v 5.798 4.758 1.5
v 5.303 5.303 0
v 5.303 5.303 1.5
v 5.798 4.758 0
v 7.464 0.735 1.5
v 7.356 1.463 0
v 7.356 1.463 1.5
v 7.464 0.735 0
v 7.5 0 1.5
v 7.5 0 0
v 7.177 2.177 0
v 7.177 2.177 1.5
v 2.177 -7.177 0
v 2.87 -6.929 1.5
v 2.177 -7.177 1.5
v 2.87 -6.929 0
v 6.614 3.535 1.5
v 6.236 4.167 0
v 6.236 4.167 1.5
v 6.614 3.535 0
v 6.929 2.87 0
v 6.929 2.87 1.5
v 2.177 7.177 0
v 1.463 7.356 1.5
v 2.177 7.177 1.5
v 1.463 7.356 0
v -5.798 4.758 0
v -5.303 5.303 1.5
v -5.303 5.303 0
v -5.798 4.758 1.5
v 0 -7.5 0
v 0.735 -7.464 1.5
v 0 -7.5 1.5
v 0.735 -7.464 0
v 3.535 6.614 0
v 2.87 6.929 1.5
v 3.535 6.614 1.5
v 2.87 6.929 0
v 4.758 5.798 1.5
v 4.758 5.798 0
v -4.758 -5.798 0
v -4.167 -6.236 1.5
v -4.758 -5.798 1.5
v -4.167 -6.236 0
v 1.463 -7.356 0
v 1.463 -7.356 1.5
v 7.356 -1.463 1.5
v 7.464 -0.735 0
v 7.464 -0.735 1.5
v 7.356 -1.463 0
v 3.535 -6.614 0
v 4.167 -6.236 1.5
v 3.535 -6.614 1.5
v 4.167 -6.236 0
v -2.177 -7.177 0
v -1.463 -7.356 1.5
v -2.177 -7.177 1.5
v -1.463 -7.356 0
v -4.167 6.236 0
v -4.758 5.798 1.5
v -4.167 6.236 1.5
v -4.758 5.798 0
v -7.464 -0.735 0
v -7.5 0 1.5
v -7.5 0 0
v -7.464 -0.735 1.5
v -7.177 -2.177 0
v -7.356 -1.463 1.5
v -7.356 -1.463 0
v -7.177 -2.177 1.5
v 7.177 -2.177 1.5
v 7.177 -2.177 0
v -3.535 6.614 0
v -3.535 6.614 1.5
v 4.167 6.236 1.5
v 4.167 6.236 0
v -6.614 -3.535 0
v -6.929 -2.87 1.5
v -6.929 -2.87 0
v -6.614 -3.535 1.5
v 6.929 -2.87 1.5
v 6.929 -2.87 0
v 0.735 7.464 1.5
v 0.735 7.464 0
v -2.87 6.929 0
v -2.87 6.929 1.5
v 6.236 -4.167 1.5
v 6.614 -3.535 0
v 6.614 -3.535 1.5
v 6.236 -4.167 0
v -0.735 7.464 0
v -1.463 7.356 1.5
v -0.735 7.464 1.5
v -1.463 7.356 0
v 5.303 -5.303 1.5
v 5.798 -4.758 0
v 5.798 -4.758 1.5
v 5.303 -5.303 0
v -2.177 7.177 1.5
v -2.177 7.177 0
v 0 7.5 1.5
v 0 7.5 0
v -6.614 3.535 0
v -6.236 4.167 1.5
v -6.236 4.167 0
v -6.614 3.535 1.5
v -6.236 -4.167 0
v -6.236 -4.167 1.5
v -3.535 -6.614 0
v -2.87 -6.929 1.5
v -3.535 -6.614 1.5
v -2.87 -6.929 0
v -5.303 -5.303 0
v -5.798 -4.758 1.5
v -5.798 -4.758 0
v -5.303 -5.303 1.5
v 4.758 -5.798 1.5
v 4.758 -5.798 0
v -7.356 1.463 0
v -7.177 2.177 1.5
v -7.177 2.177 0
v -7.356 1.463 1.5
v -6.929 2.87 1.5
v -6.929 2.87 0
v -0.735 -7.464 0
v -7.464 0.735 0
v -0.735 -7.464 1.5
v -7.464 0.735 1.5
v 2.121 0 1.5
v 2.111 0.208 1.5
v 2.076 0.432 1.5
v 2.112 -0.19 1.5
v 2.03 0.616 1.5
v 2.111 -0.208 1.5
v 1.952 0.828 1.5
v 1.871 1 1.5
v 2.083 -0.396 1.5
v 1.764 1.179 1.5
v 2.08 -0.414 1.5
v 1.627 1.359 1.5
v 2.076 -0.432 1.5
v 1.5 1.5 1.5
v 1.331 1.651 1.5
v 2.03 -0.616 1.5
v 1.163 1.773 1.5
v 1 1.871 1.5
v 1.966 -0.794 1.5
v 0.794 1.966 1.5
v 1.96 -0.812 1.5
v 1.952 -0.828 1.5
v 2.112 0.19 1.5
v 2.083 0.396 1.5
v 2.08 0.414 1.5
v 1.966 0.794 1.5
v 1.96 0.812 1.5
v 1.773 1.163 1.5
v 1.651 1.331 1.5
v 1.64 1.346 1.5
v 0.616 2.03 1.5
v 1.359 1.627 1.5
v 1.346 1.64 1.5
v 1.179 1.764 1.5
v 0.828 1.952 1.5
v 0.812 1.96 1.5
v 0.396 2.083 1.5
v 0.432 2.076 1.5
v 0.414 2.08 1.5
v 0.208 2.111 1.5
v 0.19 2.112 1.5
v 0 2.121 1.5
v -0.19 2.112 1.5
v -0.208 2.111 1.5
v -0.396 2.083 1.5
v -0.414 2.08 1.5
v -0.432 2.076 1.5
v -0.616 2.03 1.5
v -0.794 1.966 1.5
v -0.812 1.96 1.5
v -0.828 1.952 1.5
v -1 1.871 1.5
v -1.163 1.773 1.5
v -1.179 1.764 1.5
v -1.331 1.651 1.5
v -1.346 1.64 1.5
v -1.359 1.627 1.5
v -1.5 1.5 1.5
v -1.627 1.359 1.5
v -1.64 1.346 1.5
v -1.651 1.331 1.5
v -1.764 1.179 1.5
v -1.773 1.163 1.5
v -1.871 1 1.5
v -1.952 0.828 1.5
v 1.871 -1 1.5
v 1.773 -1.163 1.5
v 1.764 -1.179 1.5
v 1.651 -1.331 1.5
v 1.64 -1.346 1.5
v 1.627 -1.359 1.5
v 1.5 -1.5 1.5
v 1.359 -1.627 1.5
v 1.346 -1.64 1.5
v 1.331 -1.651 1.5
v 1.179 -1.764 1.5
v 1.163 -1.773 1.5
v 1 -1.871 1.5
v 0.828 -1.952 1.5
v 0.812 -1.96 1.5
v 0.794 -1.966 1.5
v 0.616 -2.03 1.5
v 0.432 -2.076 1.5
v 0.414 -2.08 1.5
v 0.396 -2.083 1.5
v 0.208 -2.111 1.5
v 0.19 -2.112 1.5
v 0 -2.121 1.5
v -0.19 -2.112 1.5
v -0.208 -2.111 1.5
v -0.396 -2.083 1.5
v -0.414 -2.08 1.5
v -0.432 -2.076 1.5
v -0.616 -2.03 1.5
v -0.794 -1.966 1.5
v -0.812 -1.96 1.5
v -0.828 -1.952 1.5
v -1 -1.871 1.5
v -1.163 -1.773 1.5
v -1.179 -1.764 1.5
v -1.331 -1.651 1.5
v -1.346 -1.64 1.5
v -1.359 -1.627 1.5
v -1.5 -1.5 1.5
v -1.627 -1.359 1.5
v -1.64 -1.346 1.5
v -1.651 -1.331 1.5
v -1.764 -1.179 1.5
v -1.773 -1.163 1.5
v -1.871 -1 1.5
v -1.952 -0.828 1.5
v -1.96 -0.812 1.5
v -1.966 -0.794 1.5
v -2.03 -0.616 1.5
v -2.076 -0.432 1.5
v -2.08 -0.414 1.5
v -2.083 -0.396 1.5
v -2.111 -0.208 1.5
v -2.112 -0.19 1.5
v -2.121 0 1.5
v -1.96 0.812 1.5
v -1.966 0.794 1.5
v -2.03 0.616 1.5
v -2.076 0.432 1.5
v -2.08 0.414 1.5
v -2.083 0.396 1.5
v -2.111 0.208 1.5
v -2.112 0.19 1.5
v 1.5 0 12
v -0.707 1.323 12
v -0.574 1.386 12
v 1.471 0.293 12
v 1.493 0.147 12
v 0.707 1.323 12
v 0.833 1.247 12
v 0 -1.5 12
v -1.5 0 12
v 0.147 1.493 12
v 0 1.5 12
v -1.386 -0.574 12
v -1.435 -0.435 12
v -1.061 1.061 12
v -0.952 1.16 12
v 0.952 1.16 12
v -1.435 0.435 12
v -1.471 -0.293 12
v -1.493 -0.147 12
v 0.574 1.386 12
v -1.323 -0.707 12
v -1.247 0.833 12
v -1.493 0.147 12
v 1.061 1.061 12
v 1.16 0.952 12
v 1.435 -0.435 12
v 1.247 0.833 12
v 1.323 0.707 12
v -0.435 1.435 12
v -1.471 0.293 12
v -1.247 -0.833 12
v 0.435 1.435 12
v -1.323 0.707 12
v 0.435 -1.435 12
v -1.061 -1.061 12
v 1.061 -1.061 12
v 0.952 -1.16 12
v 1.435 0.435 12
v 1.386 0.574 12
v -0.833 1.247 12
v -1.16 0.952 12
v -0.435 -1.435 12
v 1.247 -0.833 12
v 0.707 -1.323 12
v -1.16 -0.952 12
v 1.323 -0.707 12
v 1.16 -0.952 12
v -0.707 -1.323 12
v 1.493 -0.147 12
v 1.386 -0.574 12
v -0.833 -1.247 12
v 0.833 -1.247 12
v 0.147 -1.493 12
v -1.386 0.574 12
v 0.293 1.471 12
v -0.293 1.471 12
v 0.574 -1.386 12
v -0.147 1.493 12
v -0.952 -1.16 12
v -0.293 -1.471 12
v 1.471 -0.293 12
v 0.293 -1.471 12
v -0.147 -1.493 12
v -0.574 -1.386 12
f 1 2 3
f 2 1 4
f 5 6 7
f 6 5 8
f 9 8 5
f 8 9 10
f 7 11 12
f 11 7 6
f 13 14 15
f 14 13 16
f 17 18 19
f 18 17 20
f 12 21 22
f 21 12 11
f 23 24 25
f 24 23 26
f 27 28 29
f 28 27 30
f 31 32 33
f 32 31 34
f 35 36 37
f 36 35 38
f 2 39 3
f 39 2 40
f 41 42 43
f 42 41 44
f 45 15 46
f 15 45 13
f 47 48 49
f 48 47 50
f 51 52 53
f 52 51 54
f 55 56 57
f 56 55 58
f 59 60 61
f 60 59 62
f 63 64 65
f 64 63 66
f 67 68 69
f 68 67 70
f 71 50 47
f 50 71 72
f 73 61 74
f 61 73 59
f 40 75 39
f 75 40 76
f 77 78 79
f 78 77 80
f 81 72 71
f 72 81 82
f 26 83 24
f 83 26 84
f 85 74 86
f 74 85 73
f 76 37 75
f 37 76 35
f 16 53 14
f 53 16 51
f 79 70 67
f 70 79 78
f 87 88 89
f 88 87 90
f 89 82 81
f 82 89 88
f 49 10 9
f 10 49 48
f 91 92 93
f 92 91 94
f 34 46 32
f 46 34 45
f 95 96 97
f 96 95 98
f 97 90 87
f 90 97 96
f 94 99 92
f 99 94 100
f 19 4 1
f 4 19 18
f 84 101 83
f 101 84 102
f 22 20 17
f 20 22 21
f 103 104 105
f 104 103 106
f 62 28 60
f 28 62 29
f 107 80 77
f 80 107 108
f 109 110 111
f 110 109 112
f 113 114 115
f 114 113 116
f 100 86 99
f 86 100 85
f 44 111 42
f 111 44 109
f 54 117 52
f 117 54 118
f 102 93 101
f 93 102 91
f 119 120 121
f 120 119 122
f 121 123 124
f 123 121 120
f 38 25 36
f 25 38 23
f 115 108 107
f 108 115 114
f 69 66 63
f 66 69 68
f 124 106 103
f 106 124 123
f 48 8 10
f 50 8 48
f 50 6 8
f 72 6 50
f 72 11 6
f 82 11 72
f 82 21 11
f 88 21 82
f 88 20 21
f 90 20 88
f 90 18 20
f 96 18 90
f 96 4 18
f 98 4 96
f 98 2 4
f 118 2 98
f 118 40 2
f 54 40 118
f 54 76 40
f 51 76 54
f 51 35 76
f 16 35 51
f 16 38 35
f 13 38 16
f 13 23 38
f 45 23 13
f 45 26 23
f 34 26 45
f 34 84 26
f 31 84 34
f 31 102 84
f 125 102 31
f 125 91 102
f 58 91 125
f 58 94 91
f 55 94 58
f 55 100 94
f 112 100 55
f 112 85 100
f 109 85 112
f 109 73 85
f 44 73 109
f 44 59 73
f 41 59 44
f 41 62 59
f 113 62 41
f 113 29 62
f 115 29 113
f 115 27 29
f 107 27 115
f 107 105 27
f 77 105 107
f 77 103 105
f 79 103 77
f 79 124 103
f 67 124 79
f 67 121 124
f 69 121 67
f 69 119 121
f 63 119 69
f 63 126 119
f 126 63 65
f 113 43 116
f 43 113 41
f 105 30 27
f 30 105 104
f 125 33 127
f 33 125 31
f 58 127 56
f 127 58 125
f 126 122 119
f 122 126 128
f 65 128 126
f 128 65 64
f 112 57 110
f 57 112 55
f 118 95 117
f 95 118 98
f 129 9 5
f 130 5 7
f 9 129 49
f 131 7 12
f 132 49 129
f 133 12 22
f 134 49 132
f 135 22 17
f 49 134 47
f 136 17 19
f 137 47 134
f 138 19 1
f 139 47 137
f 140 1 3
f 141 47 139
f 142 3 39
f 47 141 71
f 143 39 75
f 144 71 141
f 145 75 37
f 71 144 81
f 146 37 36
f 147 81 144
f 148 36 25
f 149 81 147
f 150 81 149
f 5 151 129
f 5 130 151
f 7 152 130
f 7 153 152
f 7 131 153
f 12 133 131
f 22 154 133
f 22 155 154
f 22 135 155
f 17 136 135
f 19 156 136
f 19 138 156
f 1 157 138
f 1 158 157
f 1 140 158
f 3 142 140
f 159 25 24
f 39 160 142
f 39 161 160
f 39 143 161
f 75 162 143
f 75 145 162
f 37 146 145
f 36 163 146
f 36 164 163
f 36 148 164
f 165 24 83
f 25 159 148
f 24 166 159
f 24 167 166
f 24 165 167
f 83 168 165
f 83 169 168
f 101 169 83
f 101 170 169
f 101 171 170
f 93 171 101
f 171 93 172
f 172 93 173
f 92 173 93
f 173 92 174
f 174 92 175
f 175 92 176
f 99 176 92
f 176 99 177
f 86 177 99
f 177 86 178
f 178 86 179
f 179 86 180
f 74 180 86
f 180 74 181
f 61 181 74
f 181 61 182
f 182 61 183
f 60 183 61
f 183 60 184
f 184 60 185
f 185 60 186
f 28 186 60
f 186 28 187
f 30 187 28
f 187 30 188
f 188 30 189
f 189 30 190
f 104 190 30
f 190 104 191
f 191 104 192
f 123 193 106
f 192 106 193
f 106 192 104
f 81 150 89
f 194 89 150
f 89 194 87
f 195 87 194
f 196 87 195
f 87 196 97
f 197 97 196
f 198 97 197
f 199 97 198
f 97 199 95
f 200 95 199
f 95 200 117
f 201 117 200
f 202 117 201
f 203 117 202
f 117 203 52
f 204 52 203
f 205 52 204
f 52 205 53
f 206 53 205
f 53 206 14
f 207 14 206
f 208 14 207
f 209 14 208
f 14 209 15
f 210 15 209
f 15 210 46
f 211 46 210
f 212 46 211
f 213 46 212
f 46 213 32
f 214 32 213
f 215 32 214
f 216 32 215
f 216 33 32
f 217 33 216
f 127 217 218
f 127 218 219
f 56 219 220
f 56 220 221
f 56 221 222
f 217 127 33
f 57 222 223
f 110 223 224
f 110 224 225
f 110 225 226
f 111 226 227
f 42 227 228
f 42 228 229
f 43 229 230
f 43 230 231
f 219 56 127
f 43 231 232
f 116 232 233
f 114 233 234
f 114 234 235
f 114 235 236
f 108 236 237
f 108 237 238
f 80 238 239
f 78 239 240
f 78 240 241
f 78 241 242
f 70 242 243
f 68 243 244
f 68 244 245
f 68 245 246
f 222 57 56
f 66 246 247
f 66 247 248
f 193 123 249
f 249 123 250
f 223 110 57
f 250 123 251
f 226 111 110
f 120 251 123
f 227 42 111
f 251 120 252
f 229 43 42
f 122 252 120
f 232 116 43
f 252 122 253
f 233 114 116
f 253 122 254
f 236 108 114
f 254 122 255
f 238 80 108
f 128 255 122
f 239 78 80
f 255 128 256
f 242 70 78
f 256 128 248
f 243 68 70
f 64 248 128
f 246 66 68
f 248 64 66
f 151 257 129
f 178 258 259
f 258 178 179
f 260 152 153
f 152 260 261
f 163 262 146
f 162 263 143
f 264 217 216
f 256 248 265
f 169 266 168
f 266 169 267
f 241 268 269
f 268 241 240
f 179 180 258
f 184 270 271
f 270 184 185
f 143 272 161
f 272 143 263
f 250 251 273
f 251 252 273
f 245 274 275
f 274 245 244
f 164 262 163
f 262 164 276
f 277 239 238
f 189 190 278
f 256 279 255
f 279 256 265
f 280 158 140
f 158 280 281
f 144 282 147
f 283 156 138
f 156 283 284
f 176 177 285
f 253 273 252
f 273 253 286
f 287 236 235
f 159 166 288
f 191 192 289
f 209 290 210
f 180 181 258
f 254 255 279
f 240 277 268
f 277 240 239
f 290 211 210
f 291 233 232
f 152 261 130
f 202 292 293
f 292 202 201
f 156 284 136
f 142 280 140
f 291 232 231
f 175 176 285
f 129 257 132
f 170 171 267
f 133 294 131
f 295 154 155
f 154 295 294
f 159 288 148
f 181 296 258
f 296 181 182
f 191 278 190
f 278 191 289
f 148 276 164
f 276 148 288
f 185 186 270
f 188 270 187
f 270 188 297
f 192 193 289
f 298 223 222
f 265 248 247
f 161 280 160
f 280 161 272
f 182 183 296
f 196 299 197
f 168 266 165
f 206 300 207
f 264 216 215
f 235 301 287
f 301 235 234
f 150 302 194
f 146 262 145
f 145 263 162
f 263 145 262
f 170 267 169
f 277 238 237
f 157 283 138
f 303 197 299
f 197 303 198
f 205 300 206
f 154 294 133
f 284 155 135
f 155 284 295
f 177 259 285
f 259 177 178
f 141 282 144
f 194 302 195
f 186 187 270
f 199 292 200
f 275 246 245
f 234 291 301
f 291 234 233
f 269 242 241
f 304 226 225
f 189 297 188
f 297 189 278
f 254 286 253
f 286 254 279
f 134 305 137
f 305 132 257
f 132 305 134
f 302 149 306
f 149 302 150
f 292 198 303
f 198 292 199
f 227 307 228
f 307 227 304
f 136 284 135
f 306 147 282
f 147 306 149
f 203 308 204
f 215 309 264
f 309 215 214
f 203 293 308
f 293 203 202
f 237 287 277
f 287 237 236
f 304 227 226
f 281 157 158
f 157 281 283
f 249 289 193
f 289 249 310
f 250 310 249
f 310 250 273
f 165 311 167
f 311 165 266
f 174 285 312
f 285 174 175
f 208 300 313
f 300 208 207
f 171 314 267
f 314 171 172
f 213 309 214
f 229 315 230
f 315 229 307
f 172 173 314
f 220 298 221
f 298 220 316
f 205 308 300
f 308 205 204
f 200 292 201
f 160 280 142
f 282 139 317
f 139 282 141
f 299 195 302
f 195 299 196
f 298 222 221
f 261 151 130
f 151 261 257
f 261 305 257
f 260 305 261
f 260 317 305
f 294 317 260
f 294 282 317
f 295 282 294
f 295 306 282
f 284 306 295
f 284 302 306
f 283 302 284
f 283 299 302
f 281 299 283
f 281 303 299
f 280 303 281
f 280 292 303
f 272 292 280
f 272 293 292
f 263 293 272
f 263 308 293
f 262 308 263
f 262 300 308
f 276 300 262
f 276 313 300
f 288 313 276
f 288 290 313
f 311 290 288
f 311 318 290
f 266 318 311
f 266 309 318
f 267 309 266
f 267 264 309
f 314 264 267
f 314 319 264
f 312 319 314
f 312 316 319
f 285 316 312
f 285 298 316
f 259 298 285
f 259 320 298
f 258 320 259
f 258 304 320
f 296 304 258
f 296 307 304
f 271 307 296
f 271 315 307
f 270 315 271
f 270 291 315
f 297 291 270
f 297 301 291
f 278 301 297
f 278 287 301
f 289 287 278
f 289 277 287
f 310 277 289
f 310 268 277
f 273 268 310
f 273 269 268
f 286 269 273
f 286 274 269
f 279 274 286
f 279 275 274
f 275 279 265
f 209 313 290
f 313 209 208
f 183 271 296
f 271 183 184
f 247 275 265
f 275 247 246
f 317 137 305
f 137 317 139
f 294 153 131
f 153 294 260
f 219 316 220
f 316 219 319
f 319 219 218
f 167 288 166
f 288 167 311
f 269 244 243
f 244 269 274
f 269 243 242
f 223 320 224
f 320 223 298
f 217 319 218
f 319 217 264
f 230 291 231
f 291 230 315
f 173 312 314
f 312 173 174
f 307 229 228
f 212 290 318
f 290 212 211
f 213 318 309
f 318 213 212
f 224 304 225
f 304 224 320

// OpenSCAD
// --- Parameters ---
hole_d = 3.4;           // Protoboard hole diameter
peg_height = 12;        // Total height of the peg
taper_ratio = 1.3;      // How much wider the base is than the hole
clearance = 0.4;        // Reduction for the tip to ensure easy entry

// Base Plate Parameters
plate_h = 1.5;          // Thickness of the individual base plate
plate_d = 15.0;         // Diameter of the individual base plate

// --- Modules ---

module tapered_peg() {
    $fn = 64;
    cylinder(h = peg_height, 
             d1 = hole_d * taper_ratio,  // Bottom is wider than hole
             d2 = hole_d - clearance);   // Top is narrower than hole
}

module base_plate() {
    $fn = 64;
    cylinder(h = plate_h, d = plate_d);
}


// Complete Stand Module
module individual_stand() {
    base_plate();
    tapered_peg();
}

// Render one stand
individual_stand();
